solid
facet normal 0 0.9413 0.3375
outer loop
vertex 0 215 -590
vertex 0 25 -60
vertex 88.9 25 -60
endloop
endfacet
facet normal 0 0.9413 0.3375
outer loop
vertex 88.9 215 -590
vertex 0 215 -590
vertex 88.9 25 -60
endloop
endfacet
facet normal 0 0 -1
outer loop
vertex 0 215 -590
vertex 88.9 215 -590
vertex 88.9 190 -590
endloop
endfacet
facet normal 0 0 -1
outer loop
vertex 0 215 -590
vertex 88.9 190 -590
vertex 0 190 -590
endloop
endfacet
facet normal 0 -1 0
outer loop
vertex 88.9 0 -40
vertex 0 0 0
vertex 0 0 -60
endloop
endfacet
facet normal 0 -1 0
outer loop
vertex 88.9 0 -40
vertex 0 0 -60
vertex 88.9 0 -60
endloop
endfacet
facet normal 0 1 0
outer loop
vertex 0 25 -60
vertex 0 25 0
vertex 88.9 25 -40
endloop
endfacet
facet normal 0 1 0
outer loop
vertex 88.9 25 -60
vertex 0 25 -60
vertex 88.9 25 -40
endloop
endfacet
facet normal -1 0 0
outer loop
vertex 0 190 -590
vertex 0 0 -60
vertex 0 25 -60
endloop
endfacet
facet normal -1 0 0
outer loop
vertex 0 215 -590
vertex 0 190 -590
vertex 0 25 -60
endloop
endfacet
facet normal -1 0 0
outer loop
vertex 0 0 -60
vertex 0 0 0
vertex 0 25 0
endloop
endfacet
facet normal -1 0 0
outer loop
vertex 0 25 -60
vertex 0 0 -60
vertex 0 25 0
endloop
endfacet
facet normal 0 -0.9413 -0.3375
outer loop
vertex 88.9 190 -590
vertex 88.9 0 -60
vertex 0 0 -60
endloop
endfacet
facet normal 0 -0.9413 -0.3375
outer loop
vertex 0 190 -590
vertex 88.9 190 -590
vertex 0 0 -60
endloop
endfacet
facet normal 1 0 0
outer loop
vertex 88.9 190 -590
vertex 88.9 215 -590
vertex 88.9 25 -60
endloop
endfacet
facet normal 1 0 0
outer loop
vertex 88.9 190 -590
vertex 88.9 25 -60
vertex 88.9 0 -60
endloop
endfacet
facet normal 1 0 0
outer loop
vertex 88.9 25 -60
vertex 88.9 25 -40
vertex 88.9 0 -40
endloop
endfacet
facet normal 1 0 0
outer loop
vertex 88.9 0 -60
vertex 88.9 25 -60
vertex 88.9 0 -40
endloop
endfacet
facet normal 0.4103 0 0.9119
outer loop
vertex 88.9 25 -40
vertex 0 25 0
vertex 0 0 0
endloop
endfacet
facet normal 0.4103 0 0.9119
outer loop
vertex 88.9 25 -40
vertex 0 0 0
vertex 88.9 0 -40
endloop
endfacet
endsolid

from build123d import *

# Parameters (mm, degrees)
CROQUIS1_W              = 88.9
CROQUIS1_H              = 25
SALIENTE_EXTRUIR1_DEPTH = 60
CROQUIS2_W              = 88.9
CROQUIS2_H              = 25
CORTAR_EXTRUIR1_DEPTH   = 100


with BuildPart() as part:
    # Croquis1 → Saliente-Extruir1 (new body)
    with BuildSketch(Plane.XY):
        with Locations((44.45, 12.5)):
            Rectangle(CROQUIS1_W, CROQUIS1_H)
    extrude(amount=-SALIENTE_EXTRUIR1_DEPTH)

    # Barrer1: sweep along a curve in space
    with BuildLine() as barrer1_path:
        Line((44.45, 202.5, -590), (44.45, 12.5, -60))
    # Croquis2 → Barrer1 (sweep)
    with BuildSketch(Plane(origin=(0, 0, -60), x_dir=(-1, 0, 0), z_dir=(0, 0, -1))):
        with Locations((-44.45, 12.5)):
            Rectangle(CROQUIS2_W, CROQUIS2_H)
    sweep(path=barrer1_path.line)

    # Croquis3 → Cortar-Extruir1 (cut)
    with BuildSketch(Plane(origin=(0, 25, 0), x_dir=(1, 0, 0), z_dir=(0, 1, 0))):
        Polygon((0, 0), (88.9, 40), (88.9, 0), align=None)
    extrude(amount=-CORTAR_EXTRUIR1_DEPTH, mode=Mode.SUBTRACT)


solid = part.part
